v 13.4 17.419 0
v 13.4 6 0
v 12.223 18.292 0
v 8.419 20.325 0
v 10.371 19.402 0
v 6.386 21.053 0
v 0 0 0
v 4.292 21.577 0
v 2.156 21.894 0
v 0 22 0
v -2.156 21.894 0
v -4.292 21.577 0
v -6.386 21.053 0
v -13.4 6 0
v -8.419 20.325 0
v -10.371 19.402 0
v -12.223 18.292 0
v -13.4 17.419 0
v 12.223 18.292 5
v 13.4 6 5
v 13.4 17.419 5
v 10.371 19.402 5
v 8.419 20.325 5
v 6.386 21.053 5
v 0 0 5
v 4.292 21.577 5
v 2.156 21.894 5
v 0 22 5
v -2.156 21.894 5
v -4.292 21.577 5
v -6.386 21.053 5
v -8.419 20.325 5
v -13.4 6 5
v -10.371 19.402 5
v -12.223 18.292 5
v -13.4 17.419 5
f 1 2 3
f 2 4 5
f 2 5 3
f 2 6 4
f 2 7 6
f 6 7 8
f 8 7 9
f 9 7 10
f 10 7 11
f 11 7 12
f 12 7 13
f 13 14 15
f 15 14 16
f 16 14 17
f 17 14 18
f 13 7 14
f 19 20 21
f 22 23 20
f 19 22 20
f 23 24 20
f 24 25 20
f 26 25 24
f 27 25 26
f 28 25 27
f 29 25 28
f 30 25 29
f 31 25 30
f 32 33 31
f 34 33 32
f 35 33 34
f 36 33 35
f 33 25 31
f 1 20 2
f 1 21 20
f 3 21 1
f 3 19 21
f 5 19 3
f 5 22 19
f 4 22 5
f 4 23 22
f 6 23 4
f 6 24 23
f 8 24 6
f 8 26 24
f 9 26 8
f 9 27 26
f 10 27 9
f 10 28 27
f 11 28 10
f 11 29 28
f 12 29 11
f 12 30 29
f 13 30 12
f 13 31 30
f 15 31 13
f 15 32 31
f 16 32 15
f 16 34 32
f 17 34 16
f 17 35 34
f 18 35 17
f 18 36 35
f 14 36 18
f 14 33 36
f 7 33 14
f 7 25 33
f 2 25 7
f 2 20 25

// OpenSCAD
linear_extrude(5)
intersection() {
  circle(r = 22, $fn = 64);
  polygon([
    [0, 0],
    [13.4, 6],
    [13.4, 22],//17.5],
    [-13.4, 22],//17.5],
    [-13.4, 6]
  ]);
}
